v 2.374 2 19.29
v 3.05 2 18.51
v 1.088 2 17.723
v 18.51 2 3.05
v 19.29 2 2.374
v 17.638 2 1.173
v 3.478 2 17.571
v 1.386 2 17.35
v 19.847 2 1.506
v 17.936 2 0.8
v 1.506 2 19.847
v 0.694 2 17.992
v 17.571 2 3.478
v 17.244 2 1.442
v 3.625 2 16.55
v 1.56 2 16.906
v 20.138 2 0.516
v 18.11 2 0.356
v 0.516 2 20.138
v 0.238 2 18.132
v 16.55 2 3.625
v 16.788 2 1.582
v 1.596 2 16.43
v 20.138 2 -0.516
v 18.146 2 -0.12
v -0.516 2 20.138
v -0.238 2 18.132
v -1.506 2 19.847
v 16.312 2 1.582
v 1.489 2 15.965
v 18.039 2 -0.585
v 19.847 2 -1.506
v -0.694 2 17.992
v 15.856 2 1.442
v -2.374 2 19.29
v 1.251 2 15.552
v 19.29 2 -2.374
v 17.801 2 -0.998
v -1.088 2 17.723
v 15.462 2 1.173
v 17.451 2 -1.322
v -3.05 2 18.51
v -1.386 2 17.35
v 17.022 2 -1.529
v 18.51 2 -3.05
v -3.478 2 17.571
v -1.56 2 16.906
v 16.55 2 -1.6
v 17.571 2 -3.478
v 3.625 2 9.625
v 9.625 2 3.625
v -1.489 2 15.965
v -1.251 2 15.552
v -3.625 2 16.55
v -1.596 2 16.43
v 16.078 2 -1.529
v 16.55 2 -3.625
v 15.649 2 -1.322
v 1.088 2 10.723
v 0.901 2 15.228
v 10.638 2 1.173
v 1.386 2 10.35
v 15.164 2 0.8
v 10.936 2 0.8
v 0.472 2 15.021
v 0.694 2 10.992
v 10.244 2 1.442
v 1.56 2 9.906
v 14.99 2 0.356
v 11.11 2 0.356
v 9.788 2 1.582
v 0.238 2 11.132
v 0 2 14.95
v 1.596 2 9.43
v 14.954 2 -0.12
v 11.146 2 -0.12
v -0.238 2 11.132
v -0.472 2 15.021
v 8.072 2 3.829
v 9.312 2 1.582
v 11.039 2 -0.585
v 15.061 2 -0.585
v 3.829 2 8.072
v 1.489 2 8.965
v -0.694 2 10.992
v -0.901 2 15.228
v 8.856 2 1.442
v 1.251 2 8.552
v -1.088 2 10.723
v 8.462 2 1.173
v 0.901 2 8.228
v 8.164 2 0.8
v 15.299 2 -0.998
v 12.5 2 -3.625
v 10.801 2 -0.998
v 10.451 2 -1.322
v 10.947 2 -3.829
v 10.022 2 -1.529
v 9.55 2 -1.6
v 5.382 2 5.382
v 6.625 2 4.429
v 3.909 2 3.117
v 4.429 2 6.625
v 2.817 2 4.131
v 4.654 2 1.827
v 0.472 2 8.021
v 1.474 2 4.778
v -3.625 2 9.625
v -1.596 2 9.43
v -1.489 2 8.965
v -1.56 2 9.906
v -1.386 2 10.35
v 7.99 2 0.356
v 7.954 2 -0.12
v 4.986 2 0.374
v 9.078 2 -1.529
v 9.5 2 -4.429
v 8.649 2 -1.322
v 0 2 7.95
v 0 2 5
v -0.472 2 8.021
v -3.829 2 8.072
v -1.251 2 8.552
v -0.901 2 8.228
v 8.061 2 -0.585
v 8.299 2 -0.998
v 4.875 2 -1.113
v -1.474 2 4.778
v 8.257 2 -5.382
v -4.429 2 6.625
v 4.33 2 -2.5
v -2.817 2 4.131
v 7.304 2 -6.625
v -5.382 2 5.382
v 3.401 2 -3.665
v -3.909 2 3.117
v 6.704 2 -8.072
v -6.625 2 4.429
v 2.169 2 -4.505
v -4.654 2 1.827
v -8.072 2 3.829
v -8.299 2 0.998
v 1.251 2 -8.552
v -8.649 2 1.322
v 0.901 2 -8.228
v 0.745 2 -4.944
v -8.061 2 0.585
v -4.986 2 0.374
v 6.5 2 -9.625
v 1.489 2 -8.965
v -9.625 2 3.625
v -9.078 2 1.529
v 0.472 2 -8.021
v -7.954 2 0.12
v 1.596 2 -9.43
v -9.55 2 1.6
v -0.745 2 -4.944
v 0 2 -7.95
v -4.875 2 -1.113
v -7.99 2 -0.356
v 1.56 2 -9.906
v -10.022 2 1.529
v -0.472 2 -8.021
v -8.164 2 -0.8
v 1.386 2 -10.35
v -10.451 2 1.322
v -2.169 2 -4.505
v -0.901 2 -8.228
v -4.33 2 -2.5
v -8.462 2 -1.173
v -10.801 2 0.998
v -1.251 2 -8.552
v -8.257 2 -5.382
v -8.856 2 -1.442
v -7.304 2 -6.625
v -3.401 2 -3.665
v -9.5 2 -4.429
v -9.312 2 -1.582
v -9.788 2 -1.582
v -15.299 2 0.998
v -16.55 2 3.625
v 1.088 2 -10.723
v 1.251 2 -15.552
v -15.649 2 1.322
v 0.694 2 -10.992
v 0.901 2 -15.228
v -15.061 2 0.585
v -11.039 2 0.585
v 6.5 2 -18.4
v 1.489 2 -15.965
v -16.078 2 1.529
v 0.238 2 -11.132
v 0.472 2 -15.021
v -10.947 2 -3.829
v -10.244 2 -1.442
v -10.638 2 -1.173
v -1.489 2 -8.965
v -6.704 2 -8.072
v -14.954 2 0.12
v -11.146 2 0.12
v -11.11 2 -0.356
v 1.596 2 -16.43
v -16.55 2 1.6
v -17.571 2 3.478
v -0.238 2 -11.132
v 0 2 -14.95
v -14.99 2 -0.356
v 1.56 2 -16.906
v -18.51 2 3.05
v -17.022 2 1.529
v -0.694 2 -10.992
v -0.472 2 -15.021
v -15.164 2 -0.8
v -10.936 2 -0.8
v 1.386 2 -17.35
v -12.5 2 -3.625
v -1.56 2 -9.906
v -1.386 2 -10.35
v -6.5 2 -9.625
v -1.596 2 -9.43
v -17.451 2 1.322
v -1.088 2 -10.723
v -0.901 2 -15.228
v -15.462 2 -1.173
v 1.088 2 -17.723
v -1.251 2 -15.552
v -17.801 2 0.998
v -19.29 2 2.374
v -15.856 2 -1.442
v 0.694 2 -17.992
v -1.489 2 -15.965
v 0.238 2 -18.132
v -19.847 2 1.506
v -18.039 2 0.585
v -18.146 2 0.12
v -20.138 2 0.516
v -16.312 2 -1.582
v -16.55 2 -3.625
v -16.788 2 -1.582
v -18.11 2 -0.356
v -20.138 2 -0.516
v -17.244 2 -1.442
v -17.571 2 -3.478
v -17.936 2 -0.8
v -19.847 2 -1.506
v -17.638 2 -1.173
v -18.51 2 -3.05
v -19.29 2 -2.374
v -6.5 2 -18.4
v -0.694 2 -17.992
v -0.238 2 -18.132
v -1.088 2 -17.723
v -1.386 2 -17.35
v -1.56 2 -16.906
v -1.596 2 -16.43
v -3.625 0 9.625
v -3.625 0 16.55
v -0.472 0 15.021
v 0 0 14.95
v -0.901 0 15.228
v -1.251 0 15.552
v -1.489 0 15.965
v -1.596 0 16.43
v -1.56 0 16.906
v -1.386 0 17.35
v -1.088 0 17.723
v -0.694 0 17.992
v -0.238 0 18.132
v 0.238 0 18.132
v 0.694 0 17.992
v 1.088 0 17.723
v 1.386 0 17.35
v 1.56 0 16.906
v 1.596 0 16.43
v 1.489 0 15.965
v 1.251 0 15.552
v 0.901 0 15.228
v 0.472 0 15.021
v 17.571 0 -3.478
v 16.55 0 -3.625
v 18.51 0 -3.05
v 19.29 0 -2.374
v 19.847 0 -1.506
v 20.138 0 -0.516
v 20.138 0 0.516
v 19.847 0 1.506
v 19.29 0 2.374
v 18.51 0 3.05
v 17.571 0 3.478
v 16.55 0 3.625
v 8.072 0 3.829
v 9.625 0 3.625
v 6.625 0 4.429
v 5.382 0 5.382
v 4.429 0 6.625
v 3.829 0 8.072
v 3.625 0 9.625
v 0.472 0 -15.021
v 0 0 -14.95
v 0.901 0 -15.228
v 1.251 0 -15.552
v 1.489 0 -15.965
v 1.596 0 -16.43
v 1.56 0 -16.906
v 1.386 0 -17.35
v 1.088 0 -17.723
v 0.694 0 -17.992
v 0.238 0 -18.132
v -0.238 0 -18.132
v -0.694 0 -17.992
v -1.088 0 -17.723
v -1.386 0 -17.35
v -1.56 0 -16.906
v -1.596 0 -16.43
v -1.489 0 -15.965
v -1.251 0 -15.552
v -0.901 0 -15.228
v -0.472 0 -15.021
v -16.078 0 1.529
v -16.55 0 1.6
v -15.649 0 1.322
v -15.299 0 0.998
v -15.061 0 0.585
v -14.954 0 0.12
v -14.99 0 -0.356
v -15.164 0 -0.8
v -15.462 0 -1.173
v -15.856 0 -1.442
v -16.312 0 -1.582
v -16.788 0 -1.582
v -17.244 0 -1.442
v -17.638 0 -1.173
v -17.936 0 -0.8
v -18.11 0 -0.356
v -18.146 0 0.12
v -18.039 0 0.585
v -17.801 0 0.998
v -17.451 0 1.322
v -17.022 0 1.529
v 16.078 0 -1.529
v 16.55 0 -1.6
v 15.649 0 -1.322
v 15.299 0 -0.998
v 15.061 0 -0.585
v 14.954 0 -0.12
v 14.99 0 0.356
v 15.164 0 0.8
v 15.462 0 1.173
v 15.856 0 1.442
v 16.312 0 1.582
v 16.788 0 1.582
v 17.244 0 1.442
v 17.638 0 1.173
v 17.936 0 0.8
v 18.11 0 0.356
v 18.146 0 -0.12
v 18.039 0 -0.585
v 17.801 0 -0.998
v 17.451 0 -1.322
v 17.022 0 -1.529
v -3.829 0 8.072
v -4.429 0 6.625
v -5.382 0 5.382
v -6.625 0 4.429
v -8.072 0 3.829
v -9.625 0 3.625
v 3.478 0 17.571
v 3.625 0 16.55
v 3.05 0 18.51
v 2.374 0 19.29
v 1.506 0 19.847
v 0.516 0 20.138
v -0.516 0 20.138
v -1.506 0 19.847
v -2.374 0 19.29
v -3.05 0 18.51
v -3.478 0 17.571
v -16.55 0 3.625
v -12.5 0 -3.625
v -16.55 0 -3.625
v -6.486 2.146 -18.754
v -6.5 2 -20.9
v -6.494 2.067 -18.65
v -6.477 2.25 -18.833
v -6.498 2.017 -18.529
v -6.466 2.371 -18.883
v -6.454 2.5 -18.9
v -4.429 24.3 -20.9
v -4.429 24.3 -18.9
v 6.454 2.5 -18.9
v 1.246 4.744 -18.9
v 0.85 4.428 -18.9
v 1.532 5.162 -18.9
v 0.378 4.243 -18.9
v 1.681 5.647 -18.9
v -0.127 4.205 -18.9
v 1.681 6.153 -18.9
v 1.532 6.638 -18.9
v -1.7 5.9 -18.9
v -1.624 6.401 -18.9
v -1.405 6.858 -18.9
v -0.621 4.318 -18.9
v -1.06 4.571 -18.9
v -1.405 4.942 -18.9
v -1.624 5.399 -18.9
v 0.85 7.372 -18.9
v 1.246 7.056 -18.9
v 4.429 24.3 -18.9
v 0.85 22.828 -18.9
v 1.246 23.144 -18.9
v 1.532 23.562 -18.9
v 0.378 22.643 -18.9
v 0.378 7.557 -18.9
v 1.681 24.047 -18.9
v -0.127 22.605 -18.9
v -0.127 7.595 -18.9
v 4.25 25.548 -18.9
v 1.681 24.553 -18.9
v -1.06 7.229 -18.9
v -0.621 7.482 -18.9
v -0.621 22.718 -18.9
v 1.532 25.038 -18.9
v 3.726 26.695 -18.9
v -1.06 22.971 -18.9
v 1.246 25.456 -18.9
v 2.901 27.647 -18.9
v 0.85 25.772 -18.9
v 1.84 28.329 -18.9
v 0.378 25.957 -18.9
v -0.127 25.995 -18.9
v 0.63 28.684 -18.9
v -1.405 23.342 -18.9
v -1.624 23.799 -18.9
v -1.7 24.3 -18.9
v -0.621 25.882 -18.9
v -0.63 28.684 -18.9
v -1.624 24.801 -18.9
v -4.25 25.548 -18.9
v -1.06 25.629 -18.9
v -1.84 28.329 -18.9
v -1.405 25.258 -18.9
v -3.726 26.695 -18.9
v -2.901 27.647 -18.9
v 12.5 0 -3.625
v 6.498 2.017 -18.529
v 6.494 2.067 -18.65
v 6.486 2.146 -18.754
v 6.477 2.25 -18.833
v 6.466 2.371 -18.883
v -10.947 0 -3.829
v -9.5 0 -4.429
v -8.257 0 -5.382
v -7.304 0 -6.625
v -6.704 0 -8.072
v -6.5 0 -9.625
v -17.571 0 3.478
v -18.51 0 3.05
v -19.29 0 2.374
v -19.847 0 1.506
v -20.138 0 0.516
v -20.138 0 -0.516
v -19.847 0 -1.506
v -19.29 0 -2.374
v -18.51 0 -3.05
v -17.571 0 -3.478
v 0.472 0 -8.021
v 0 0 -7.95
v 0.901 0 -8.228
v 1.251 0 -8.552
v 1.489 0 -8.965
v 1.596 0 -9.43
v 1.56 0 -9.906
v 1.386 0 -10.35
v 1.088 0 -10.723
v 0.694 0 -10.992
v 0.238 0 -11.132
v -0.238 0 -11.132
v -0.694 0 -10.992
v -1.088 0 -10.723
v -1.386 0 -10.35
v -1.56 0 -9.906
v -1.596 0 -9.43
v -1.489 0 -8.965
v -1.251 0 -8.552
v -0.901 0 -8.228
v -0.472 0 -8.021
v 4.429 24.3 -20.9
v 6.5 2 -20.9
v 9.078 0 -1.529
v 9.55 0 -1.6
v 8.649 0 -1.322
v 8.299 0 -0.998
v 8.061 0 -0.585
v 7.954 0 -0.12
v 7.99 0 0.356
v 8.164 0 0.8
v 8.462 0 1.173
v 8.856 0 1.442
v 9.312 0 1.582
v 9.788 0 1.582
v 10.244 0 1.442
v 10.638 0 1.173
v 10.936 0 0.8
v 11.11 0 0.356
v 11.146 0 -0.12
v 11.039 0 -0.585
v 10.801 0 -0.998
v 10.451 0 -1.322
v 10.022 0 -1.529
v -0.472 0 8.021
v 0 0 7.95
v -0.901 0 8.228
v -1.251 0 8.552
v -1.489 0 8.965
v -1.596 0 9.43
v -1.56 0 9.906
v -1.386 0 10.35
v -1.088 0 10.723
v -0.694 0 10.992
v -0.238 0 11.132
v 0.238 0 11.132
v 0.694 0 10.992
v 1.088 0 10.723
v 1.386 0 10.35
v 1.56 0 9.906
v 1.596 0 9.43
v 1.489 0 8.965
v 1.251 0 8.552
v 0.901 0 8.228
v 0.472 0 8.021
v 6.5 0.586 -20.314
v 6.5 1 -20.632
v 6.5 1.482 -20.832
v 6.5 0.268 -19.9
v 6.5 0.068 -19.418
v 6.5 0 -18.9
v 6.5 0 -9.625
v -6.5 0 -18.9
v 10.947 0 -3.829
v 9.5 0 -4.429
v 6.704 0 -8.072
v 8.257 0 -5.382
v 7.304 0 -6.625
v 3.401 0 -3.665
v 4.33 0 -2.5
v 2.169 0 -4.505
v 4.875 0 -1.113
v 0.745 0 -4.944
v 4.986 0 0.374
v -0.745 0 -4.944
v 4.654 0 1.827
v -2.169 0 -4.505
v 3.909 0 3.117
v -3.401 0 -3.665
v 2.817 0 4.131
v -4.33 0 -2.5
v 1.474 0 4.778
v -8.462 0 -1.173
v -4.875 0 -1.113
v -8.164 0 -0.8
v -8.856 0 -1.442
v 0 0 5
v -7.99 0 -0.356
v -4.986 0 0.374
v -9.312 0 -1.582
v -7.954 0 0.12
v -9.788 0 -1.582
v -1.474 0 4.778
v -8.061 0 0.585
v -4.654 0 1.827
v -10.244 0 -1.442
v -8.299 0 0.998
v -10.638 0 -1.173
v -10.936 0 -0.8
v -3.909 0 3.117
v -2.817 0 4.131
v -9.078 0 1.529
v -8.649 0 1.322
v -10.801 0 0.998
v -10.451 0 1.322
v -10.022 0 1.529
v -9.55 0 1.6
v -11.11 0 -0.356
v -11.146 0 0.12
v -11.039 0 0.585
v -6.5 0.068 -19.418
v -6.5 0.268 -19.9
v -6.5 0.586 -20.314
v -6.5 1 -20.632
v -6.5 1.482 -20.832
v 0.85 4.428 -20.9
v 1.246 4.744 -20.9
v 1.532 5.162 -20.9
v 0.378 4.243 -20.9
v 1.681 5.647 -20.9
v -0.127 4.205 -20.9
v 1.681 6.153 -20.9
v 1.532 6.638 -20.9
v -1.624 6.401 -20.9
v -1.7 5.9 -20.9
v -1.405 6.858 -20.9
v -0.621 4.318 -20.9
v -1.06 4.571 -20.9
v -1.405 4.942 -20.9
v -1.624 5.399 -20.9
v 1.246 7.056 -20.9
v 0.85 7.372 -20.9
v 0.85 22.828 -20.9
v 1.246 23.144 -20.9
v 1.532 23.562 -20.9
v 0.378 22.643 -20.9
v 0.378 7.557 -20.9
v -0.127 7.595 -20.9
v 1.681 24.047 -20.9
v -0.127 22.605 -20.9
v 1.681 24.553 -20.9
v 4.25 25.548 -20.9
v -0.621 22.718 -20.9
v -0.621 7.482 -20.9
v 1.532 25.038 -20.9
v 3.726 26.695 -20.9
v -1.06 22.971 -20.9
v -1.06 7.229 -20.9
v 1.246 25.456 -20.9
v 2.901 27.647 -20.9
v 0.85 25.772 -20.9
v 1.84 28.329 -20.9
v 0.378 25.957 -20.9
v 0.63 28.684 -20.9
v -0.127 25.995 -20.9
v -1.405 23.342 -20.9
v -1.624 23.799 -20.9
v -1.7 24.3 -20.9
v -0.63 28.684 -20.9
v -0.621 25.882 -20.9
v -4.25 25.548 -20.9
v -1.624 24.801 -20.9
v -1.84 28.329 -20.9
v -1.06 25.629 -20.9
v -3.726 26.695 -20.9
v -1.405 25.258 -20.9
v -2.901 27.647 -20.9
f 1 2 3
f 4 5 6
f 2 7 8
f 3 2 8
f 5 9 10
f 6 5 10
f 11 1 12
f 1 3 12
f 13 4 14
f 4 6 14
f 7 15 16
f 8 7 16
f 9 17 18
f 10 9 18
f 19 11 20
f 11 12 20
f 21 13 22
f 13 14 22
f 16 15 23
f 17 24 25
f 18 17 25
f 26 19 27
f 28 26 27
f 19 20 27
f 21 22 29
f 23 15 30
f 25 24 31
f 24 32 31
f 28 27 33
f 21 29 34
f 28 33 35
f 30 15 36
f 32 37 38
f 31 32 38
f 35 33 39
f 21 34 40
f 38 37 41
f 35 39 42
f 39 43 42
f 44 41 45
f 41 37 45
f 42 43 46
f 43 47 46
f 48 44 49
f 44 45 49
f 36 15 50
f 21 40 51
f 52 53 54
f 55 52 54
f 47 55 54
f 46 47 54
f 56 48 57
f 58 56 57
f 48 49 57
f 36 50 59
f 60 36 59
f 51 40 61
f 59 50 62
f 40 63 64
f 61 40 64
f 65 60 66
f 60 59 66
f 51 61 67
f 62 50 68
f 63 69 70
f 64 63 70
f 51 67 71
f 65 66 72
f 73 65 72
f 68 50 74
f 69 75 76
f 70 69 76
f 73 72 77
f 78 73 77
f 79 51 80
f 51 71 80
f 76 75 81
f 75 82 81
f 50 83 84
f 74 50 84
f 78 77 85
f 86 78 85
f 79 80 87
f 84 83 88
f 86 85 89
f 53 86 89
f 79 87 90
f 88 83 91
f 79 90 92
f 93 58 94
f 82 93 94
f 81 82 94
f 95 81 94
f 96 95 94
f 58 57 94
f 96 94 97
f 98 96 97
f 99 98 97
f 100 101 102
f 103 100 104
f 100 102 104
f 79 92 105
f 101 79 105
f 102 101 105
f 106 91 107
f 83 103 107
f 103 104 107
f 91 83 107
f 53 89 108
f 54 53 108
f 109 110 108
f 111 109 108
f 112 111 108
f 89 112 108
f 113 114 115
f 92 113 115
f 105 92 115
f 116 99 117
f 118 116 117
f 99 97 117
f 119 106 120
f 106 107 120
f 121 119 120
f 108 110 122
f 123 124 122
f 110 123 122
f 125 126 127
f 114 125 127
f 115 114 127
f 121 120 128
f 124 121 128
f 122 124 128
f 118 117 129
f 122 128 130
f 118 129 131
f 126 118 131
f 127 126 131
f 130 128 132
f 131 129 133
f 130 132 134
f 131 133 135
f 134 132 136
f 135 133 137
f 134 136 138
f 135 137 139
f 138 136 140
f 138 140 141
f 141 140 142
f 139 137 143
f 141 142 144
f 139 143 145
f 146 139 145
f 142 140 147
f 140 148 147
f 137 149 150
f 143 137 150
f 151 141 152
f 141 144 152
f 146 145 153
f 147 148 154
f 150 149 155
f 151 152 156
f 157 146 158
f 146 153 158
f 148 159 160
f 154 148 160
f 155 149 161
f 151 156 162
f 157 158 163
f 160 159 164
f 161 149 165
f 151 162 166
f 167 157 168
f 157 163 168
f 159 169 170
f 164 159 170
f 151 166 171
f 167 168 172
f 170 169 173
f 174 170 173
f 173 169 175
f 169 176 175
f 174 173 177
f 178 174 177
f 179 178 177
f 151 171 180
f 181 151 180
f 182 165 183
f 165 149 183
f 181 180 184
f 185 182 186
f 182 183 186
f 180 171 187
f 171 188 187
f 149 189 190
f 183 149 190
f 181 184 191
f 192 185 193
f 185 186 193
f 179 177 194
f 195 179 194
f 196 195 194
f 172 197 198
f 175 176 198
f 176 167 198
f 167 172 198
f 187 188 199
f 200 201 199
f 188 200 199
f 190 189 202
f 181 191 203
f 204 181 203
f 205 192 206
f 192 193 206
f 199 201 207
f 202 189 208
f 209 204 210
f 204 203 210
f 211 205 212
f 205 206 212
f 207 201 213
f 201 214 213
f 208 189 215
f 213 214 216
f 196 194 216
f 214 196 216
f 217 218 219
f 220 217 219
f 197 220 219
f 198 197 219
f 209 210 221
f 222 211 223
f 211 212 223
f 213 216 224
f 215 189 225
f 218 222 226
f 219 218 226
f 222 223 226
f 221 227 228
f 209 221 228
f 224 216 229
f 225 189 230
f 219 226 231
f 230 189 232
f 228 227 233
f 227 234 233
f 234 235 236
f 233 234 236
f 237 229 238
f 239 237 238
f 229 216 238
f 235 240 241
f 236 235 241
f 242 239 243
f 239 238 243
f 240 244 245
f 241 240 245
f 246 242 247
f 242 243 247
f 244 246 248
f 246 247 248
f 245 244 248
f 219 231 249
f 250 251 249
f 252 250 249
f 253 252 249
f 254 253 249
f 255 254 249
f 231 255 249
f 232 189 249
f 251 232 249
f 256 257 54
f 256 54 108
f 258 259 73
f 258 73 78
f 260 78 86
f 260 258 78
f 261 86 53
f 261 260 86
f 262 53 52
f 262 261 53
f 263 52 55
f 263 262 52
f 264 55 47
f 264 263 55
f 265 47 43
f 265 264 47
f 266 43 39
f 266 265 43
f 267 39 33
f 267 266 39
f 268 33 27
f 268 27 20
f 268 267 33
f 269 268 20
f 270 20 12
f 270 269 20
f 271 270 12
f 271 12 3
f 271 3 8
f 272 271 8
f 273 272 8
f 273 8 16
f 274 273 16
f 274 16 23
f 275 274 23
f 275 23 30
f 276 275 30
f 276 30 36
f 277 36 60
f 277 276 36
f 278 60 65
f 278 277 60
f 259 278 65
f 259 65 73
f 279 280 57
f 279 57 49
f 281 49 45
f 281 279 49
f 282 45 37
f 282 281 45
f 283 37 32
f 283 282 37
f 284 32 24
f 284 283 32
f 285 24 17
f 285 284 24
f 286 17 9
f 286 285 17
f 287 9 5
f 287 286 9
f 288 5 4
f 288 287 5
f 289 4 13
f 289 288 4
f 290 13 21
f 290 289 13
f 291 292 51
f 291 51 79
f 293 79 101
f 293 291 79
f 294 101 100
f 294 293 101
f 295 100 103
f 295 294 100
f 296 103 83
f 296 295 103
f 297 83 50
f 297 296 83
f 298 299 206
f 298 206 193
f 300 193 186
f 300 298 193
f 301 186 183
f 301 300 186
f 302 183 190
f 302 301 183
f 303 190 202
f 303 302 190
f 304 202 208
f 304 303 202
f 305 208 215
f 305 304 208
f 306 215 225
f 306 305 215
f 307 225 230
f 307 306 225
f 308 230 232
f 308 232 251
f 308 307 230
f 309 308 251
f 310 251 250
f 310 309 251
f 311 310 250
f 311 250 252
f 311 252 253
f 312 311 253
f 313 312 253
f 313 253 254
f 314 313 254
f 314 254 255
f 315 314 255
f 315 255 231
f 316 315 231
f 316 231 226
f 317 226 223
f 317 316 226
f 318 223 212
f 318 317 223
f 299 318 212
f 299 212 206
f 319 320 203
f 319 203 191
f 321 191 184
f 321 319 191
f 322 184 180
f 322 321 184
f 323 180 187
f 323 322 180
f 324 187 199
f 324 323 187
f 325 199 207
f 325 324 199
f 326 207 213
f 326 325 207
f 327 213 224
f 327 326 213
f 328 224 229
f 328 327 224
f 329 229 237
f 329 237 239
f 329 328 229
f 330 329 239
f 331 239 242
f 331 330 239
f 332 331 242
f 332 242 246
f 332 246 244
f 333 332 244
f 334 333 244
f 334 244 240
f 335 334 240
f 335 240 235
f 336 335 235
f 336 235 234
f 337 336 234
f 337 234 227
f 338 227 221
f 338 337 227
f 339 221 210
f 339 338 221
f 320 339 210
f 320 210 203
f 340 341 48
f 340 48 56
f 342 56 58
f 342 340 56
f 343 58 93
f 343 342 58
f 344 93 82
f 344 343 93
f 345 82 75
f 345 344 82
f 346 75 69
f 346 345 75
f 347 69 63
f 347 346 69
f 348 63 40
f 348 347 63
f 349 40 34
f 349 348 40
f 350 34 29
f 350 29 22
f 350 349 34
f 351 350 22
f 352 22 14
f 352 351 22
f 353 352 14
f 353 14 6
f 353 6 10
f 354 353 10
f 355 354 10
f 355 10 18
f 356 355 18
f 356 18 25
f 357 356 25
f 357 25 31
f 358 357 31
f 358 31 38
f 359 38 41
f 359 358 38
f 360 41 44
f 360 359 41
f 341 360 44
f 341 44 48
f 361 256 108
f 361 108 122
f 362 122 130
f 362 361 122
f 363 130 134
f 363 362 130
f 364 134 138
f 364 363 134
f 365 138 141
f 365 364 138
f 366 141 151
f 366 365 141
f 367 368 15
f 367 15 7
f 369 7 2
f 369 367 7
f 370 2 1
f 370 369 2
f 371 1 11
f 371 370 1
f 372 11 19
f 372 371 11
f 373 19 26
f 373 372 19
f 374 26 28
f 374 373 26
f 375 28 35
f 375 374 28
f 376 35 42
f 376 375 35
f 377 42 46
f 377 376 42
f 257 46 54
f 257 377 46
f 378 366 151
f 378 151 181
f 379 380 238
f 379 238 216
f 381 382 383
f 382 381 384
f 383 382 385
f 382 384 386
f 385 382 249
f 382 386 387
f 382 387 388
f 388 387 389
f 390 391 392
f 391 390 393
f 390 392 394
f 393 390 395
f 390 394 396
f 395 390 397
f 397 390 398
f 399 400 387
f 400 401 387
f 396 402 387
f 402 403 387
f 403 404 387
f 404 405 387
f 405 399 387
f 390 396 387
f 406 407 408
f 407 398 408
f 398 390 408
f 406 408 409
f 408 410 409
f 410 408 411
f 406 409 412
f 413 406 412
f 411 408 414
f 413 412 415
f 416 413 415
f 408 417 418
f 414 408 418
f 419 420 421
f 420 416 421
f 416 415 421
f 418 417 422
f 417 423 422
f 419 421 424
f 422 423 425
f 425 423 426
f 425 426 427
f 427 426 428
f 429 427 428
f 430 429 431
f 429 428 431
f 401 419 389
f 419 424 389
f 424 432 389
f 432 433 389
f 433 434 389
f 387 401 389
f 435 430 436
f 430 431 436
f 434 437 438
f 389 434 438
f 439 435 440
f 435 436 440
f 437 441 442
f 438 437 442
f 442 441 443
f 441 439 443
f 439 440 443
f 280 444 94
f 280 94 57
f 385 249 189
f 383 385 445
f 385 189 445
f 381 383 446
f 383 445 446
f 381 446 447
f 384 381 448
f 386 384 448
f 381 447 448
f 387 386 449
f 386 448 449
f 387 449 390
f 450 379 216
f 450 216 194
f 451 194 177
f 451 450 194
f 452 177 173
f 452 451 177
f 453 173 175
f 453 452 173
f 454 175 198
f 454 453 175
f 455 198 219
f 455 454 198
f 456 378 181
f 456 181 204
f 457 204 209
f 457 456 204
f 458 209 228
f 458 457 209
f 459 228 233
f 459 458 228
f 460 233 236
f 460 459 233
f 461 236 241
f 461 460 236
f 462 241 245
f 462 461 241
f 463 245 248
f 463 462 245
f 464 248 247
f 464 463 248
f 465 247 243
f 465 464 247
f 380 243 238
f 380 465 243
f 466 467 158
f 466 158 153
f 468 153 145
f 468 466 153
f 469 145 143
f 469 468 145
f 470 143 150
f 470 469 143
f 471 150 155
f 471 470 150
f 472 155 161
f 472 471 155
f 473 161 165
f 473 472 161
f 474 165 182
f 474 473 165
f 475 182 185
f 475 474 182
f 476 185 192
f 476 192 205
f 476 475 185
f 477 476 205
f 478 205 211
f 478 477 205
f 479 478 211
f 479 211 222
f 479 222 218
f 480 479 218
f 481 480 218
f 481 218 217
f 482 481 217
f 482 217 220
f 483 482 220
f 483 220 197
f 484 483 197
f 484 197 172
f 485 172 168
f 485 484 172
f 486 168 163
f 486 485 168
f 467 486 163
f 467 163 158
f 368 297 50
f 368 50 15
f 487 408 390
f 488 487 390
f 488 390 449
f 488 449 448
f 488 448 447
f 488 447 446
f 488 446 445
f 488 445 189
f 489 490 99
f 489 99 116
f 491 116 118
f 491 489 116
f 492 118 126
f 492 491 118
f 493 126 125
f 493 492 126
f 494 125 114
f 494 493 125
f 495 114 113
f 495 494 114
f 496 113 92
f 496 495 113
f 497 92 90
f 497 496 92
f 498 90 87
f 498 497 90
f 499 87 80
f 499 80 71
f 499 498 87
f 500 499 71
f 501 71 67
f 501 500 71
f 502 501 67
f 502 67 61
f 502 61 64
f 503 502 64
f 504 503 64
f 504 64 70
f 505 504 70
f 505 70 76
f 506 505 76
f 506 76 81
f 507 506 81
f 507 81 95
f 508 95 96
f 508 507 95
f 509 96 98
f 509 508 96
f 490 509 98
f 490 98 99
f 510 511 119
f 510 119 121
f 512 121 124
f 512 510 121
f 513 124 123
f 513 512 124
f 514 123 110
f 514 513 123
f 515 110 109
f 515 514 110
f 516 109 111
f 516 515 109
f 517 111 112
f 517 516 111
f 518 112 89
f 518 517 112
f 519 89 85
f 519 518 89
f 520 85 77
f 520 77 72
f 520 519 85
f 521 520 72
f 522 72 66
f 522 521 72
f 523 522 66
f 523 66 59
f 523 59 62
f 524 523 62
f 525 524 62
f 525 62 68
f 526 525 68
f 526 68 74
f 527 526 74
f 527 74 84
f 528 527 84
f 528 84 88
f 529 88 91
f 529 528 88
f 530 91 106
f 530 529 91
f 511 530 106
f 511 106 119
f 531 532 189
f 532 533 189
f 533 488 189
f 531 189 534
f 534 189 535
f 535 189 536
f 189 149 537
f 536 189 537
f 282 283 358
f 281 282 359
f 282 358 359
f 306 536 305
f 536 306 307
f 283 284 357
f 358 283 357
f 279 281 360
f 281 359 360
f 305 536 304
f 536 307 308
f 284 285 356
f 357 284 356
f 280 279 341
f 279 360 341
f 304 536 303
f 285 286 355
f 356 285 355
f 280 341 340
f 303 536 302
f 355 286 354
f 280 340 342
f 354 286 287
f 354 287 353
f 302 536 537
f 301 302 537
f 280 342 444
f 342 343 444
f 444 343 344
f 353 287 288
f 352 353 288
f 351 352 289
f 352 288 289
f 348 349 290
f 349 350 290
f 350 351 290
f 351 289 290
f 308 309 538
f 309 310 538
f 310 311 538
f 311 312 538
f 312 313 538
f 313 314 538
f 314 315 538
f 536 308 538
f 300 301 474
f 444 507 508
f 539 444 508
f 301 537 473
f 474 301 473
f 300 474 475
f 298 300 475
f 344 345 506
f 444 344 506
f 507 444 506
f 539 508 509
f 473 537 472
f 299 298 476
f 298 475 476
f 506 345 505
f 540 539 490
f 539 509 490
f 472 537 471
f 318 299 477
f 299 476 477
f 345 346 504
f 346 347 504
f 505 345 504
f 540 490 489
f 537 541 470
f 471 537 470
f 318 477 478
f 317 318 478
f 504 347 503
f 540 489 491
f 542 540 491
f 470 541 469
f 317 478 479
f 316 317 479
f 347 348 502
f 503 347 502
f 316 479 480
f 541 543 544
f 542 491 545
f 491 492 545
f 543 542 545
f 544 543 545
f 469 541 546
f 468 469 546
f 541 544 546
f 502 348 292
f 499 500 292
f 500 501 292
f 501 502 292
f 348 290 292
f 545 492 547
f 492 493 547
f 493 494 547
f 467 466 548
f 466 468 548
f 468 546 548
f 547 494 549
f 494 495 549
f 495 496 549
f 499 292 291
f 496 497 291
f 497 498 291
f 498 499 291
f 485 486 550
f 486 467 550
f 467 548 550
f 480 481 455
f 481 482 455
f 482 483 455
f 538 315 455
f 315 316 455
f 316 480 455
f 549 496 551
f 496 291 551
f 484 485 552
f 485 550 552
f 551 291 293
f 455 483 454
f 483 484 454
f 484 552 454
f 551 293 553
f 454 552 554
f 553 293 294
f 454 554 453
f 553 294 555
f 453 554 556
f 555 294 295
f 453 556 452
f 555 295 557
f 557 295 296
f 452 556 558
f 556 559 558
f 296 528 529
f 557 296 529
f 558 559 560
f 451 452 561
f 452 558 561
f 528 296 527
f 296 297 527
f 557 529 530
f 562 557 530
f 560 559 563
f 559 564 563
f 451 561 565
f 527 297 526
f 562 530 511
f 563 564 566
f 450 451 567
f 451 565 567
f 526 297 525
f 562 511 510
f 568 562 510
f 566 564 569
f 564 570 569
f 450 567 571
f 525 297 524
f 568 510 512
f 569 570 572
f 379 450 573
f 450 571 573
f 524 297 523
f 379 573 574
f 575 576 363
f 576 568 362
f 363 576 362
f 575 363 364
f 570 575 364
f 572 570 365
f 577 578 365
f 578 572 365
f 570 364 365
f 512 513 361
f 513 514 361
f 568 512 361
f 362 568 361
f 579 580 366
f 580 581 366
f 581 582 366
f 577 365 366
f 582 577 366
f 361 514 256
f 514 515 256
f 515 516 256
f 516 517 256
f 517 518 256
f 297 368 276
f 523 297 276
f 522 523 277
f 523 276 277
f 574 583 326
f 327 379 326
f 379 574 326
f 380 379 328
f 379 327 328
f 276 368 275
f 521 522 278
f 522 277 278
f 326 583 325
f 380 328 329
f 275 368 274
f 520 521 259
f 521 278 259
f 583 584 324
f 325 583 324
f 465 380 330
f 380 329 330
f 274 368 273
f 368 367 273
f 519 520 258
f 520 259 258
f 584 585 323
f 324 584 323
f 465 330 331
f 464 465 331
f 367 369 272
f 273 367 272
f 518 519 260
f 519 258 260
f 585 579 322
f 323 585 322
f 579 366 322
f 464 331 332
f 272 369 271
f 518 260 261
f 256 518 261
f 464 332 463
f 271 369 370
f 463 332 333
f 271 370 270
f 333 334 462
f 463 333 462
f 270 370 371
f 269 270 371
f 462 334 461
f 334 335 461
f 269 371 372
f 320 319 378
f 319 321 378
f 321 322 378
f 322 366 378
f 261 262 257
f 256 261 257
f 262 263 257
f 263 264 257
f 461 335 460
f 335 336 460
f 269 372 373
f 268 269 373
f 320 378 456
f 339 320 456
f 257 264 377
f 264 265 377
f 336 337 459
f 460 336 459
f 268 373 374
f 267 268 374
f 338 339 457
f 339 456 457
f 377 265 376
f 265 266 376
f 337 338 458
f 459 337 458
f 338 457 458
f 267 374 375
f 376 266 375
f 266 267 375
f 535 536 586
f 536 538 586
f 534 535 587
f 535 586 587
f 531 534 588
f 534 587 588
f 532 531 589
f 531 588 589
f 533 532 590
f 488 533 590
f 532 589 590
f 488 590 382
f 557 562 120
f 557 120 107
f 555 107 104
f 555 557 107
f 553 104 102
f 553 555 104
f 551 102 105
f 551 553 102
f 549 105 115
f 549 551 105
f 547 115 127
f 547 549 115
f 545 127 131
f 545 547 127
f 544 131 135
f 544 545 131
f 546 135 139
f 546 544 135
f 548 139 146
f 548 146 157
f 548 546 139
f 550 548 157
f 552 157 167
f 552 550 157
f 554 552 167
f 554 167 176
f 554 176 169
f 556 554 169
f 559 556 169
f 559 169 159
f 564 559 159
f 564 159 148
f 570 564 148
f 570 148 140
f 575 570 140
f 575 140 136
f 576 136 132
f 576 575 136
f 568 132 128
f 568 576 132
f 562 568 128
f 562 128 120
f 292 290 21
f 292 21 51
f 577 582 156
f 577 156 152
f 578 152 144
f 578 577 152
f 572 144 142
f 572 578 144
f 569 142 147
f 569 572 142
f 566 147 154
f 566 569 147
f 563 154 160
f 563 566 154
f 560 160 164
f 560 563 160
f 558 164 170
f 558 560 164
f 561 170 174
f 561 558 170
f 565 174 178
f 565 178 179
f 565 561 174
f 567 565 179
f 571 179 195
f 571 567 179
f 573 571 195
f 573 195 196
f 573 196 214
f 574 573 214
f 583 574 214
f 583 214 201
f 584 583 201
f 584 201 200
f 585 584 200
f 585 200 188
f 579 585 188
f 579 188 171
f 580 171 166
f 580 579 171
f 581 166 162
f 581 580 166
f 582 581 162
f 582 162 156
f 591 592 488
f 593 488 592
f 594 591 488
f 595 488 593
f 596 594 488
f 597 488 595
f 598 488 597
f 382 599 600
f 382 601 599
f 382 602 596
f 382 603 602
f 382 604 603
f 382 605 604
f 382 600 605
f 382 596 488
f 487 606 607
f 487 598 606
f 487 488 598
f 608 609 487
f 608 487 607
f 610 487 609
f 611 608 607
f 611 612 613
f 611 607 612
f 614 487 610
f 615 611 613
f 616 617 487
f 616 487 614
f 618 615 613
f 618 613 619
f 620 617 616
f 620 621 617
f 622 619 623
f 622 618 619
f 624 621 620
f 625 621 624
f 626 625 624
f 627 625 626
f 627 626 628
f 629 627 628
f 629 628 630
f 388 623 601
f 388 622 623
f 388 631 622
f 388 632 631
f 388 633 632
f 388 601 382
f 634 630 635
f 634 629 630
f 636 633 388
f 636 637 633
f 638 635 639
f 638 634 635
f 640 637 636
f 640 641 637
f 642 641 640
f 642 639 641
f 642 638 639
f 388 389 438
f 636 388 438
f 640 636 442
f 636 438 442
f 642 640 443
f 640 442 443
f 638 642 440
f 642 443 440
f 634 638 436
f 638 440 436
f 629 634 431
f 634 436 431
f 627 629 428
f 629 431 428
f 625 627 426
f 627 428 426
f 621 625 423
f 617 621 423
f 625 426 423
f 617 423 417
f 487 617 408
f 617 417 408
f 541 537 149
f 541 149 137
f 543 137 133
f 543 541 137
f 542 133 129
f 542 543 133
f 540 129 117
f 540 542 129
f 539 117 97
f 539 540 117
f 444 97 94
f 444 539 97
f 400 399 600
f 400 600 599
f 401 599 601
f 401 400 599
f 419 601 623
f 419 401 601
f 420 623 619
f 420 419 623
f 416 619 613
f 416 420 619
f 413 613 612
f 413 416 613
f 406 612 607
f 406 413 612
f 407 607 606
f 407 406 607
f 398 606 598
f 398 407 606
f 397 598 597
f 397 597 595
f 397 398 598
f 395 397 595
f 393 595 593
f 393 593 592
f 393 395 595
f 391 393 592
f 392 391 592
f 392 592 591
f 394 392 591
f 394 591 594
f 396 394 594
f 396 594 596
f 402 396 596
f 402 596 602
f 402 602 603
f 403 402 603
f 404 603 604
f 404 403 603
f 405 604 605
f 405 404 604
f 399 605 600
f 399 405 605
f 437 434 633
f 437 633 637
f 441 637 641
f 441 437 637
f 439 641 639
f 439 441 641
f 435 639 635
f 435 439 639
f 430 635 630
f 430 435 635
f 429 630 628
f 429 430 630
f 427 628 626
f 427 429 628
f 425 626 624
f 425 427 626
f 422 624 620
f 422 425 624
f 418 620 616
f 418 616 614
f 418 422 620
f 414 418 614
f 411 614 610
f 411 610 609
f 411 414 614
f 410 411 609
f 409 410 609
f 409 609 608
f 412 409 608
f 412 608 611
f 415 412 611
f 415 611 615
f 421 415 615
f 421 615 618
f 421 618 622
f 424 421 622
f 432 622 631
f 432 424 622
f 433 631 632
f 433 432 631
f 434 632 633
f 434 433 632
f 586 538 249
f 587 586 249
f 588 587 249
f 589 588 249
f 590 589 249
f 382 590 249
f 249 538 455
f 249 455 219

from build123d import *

# Parameters (mm, degrees)
ESQUISSE1_R        = 5
ESQUISSE1_R_2      = 1.6
BOSS_EXTRU_1_DEPTH = 2
ESQUISSE2_R        = 1.7
BOSS_EXTRU_2_DEPTH = 2
CONG_2_R           = 2
CONG_3_R           = 0.5


with BuildPart() as part:
    # Esquisse1 → Boss.-Extru.1 (new body)
    with BuildSketch(Plane(origin=(0, 0, 0), x_dir=(1, 0, 0), z_dir=(0, 1, 0))):
        with BuildLine():
            Line((-16.55, 3.625), (-12.5, 3.625))
            ThreePointArc((-12.5, 3.625), (-8.257359313, 5.382359313), (-6.5, 9.625))
            Line((-6.5, 9.625), (-6.5, 18.9))
            Line((-6.5, 18.9), (6.5, 18.9))
            Line((6.5, 18.9), (6.5, 9.625))
            ThreePointArc((6.5, 9.625), (8.257359313, 5.382359313), (12.5, 3.625))
            Line((12.5, 3.625), (16.55, 3.625))
            ThreePointArc((16.55, 3.625), (20.175, 0), (16.55, -3.625))
            Line((16.55, -3.625), (9.625, -3.625))
            ThreePointArc((9.625, -3.625), (5.382359313, -5.382359313), (3.625, -9.625))
            Line((3.625, -9.625), (3.625, -16.55))
            ThreePointArc((3.625, -16.55), (0, -20.175), (-3.625, -16.55))
            Line((-3.625, -16.55), (-3.625, -9.625))
            ThreePointArc((-3.625, -9.625), (-5.382359313, -5.382359313), (-9.625, -3.625))
            Line((-9.625, -3.625), (-16.55, -3.625))
            ThreePointArc((-16.55, -3.625), (-20.175, 0), (-16.55, 3.625))
        make_face()
        with Locations(Location((0, 0, 0), (0, 0, 270))):
            Circle(ESQUISSE1_R, mode=Mode.SUBTRACT)
        with Locations(Location((-9.55, 0, 0), (0, 0, 270))):
            Circle(ESQUISSE1_R_2, mode=Mode.SUBTRACT)
        with Locations(Location((-16.55, 0, 0), (0, 0, 270))):
            Circle(ESQUISSE1_R_2, mode=Mode.SUBTRACT)
        with Locations(Location((9.55, 0, 0), (0, 0, 90))):
            Circle(ESQUISSE1_R_2, mode=Mode.SUBTRACT)
        with Locations(Location((16.55, 0, 0), (0, 0, 90))):
            Circle(ESQUISSE1_R_2, mode=Mode.SUBTRACT)
        with Locations(Location((0, -9.55, 0), (0, 0, 90))):
            Circle(ESQUISSE1_R_2, mode=Mode.SUBTRACT)
        with Locations(Location((0, -16.55, 0), (0, 0, 90))):
            Circle(ESQUISSE1_R_2, mode=Mode.SUBTRACT)
        with Locations(Location((0, 16.55, 0), (0, 0, 270))):
            Circle(ESQUISSE1_R_2, mode=Mode.SUBTRACT)
        with Locations(Location((0, 9.55, 0), (0, 0, 270))):
            Circle(ESQUISSE1_R_2, mode=Mode.SUBTRACT)
    extrude(amount=BOSS_EXTRU_1_DEPTH)

    # Esquisse2 → Boss.-Extru.2 (add)
    with BuildSketch(Plane(origin=(0, 0, -18.9), x_dir=(-1, 0, 0), z_dir=(0, 0, -1))):
        with BuildLine():
            Line((-6.5, 0), (6.5, 0))
            Line((6.5, 0), (6.5, 2))
            Line((6.5, 2), (4.429285714, 24.3))
            ThreePointArc((4.429285714, 24.3), (0, 28.729285714), (-4.429285714, 24.3))
            Line((-4.429285714, 24.3), (-6.5, 2))
            Line((-6.5, 2), (-6.5, 0))
        make_face()
        with Locations((0, 24.3)):
            Circle(ESQUISSE2_R, mode=Mode.SUBTRACT)
        with Locations((0, 5.9)):
            Circle(ESQUISSE2_R, mode=Mode.SUBTRACT)
    extrude(amount=BOSS_EXTRU_2_DEPTH)

    # Congé2
    cong_2_edges = [part.edges().sort_by_distance(p)[0] for p in [
        (0, 0, -20.9),
    ]]
    fillet(cong_2_edges, radius=CONG_2_R)

    # Congé3
    cong_3_edges = [part.edges().sort_by_distance(p)[0] for p in [
        (0, 2, -18.9),
    ]]
    fillet(cong_3_edges, radius=CONG_3_R)


solid = part.part
